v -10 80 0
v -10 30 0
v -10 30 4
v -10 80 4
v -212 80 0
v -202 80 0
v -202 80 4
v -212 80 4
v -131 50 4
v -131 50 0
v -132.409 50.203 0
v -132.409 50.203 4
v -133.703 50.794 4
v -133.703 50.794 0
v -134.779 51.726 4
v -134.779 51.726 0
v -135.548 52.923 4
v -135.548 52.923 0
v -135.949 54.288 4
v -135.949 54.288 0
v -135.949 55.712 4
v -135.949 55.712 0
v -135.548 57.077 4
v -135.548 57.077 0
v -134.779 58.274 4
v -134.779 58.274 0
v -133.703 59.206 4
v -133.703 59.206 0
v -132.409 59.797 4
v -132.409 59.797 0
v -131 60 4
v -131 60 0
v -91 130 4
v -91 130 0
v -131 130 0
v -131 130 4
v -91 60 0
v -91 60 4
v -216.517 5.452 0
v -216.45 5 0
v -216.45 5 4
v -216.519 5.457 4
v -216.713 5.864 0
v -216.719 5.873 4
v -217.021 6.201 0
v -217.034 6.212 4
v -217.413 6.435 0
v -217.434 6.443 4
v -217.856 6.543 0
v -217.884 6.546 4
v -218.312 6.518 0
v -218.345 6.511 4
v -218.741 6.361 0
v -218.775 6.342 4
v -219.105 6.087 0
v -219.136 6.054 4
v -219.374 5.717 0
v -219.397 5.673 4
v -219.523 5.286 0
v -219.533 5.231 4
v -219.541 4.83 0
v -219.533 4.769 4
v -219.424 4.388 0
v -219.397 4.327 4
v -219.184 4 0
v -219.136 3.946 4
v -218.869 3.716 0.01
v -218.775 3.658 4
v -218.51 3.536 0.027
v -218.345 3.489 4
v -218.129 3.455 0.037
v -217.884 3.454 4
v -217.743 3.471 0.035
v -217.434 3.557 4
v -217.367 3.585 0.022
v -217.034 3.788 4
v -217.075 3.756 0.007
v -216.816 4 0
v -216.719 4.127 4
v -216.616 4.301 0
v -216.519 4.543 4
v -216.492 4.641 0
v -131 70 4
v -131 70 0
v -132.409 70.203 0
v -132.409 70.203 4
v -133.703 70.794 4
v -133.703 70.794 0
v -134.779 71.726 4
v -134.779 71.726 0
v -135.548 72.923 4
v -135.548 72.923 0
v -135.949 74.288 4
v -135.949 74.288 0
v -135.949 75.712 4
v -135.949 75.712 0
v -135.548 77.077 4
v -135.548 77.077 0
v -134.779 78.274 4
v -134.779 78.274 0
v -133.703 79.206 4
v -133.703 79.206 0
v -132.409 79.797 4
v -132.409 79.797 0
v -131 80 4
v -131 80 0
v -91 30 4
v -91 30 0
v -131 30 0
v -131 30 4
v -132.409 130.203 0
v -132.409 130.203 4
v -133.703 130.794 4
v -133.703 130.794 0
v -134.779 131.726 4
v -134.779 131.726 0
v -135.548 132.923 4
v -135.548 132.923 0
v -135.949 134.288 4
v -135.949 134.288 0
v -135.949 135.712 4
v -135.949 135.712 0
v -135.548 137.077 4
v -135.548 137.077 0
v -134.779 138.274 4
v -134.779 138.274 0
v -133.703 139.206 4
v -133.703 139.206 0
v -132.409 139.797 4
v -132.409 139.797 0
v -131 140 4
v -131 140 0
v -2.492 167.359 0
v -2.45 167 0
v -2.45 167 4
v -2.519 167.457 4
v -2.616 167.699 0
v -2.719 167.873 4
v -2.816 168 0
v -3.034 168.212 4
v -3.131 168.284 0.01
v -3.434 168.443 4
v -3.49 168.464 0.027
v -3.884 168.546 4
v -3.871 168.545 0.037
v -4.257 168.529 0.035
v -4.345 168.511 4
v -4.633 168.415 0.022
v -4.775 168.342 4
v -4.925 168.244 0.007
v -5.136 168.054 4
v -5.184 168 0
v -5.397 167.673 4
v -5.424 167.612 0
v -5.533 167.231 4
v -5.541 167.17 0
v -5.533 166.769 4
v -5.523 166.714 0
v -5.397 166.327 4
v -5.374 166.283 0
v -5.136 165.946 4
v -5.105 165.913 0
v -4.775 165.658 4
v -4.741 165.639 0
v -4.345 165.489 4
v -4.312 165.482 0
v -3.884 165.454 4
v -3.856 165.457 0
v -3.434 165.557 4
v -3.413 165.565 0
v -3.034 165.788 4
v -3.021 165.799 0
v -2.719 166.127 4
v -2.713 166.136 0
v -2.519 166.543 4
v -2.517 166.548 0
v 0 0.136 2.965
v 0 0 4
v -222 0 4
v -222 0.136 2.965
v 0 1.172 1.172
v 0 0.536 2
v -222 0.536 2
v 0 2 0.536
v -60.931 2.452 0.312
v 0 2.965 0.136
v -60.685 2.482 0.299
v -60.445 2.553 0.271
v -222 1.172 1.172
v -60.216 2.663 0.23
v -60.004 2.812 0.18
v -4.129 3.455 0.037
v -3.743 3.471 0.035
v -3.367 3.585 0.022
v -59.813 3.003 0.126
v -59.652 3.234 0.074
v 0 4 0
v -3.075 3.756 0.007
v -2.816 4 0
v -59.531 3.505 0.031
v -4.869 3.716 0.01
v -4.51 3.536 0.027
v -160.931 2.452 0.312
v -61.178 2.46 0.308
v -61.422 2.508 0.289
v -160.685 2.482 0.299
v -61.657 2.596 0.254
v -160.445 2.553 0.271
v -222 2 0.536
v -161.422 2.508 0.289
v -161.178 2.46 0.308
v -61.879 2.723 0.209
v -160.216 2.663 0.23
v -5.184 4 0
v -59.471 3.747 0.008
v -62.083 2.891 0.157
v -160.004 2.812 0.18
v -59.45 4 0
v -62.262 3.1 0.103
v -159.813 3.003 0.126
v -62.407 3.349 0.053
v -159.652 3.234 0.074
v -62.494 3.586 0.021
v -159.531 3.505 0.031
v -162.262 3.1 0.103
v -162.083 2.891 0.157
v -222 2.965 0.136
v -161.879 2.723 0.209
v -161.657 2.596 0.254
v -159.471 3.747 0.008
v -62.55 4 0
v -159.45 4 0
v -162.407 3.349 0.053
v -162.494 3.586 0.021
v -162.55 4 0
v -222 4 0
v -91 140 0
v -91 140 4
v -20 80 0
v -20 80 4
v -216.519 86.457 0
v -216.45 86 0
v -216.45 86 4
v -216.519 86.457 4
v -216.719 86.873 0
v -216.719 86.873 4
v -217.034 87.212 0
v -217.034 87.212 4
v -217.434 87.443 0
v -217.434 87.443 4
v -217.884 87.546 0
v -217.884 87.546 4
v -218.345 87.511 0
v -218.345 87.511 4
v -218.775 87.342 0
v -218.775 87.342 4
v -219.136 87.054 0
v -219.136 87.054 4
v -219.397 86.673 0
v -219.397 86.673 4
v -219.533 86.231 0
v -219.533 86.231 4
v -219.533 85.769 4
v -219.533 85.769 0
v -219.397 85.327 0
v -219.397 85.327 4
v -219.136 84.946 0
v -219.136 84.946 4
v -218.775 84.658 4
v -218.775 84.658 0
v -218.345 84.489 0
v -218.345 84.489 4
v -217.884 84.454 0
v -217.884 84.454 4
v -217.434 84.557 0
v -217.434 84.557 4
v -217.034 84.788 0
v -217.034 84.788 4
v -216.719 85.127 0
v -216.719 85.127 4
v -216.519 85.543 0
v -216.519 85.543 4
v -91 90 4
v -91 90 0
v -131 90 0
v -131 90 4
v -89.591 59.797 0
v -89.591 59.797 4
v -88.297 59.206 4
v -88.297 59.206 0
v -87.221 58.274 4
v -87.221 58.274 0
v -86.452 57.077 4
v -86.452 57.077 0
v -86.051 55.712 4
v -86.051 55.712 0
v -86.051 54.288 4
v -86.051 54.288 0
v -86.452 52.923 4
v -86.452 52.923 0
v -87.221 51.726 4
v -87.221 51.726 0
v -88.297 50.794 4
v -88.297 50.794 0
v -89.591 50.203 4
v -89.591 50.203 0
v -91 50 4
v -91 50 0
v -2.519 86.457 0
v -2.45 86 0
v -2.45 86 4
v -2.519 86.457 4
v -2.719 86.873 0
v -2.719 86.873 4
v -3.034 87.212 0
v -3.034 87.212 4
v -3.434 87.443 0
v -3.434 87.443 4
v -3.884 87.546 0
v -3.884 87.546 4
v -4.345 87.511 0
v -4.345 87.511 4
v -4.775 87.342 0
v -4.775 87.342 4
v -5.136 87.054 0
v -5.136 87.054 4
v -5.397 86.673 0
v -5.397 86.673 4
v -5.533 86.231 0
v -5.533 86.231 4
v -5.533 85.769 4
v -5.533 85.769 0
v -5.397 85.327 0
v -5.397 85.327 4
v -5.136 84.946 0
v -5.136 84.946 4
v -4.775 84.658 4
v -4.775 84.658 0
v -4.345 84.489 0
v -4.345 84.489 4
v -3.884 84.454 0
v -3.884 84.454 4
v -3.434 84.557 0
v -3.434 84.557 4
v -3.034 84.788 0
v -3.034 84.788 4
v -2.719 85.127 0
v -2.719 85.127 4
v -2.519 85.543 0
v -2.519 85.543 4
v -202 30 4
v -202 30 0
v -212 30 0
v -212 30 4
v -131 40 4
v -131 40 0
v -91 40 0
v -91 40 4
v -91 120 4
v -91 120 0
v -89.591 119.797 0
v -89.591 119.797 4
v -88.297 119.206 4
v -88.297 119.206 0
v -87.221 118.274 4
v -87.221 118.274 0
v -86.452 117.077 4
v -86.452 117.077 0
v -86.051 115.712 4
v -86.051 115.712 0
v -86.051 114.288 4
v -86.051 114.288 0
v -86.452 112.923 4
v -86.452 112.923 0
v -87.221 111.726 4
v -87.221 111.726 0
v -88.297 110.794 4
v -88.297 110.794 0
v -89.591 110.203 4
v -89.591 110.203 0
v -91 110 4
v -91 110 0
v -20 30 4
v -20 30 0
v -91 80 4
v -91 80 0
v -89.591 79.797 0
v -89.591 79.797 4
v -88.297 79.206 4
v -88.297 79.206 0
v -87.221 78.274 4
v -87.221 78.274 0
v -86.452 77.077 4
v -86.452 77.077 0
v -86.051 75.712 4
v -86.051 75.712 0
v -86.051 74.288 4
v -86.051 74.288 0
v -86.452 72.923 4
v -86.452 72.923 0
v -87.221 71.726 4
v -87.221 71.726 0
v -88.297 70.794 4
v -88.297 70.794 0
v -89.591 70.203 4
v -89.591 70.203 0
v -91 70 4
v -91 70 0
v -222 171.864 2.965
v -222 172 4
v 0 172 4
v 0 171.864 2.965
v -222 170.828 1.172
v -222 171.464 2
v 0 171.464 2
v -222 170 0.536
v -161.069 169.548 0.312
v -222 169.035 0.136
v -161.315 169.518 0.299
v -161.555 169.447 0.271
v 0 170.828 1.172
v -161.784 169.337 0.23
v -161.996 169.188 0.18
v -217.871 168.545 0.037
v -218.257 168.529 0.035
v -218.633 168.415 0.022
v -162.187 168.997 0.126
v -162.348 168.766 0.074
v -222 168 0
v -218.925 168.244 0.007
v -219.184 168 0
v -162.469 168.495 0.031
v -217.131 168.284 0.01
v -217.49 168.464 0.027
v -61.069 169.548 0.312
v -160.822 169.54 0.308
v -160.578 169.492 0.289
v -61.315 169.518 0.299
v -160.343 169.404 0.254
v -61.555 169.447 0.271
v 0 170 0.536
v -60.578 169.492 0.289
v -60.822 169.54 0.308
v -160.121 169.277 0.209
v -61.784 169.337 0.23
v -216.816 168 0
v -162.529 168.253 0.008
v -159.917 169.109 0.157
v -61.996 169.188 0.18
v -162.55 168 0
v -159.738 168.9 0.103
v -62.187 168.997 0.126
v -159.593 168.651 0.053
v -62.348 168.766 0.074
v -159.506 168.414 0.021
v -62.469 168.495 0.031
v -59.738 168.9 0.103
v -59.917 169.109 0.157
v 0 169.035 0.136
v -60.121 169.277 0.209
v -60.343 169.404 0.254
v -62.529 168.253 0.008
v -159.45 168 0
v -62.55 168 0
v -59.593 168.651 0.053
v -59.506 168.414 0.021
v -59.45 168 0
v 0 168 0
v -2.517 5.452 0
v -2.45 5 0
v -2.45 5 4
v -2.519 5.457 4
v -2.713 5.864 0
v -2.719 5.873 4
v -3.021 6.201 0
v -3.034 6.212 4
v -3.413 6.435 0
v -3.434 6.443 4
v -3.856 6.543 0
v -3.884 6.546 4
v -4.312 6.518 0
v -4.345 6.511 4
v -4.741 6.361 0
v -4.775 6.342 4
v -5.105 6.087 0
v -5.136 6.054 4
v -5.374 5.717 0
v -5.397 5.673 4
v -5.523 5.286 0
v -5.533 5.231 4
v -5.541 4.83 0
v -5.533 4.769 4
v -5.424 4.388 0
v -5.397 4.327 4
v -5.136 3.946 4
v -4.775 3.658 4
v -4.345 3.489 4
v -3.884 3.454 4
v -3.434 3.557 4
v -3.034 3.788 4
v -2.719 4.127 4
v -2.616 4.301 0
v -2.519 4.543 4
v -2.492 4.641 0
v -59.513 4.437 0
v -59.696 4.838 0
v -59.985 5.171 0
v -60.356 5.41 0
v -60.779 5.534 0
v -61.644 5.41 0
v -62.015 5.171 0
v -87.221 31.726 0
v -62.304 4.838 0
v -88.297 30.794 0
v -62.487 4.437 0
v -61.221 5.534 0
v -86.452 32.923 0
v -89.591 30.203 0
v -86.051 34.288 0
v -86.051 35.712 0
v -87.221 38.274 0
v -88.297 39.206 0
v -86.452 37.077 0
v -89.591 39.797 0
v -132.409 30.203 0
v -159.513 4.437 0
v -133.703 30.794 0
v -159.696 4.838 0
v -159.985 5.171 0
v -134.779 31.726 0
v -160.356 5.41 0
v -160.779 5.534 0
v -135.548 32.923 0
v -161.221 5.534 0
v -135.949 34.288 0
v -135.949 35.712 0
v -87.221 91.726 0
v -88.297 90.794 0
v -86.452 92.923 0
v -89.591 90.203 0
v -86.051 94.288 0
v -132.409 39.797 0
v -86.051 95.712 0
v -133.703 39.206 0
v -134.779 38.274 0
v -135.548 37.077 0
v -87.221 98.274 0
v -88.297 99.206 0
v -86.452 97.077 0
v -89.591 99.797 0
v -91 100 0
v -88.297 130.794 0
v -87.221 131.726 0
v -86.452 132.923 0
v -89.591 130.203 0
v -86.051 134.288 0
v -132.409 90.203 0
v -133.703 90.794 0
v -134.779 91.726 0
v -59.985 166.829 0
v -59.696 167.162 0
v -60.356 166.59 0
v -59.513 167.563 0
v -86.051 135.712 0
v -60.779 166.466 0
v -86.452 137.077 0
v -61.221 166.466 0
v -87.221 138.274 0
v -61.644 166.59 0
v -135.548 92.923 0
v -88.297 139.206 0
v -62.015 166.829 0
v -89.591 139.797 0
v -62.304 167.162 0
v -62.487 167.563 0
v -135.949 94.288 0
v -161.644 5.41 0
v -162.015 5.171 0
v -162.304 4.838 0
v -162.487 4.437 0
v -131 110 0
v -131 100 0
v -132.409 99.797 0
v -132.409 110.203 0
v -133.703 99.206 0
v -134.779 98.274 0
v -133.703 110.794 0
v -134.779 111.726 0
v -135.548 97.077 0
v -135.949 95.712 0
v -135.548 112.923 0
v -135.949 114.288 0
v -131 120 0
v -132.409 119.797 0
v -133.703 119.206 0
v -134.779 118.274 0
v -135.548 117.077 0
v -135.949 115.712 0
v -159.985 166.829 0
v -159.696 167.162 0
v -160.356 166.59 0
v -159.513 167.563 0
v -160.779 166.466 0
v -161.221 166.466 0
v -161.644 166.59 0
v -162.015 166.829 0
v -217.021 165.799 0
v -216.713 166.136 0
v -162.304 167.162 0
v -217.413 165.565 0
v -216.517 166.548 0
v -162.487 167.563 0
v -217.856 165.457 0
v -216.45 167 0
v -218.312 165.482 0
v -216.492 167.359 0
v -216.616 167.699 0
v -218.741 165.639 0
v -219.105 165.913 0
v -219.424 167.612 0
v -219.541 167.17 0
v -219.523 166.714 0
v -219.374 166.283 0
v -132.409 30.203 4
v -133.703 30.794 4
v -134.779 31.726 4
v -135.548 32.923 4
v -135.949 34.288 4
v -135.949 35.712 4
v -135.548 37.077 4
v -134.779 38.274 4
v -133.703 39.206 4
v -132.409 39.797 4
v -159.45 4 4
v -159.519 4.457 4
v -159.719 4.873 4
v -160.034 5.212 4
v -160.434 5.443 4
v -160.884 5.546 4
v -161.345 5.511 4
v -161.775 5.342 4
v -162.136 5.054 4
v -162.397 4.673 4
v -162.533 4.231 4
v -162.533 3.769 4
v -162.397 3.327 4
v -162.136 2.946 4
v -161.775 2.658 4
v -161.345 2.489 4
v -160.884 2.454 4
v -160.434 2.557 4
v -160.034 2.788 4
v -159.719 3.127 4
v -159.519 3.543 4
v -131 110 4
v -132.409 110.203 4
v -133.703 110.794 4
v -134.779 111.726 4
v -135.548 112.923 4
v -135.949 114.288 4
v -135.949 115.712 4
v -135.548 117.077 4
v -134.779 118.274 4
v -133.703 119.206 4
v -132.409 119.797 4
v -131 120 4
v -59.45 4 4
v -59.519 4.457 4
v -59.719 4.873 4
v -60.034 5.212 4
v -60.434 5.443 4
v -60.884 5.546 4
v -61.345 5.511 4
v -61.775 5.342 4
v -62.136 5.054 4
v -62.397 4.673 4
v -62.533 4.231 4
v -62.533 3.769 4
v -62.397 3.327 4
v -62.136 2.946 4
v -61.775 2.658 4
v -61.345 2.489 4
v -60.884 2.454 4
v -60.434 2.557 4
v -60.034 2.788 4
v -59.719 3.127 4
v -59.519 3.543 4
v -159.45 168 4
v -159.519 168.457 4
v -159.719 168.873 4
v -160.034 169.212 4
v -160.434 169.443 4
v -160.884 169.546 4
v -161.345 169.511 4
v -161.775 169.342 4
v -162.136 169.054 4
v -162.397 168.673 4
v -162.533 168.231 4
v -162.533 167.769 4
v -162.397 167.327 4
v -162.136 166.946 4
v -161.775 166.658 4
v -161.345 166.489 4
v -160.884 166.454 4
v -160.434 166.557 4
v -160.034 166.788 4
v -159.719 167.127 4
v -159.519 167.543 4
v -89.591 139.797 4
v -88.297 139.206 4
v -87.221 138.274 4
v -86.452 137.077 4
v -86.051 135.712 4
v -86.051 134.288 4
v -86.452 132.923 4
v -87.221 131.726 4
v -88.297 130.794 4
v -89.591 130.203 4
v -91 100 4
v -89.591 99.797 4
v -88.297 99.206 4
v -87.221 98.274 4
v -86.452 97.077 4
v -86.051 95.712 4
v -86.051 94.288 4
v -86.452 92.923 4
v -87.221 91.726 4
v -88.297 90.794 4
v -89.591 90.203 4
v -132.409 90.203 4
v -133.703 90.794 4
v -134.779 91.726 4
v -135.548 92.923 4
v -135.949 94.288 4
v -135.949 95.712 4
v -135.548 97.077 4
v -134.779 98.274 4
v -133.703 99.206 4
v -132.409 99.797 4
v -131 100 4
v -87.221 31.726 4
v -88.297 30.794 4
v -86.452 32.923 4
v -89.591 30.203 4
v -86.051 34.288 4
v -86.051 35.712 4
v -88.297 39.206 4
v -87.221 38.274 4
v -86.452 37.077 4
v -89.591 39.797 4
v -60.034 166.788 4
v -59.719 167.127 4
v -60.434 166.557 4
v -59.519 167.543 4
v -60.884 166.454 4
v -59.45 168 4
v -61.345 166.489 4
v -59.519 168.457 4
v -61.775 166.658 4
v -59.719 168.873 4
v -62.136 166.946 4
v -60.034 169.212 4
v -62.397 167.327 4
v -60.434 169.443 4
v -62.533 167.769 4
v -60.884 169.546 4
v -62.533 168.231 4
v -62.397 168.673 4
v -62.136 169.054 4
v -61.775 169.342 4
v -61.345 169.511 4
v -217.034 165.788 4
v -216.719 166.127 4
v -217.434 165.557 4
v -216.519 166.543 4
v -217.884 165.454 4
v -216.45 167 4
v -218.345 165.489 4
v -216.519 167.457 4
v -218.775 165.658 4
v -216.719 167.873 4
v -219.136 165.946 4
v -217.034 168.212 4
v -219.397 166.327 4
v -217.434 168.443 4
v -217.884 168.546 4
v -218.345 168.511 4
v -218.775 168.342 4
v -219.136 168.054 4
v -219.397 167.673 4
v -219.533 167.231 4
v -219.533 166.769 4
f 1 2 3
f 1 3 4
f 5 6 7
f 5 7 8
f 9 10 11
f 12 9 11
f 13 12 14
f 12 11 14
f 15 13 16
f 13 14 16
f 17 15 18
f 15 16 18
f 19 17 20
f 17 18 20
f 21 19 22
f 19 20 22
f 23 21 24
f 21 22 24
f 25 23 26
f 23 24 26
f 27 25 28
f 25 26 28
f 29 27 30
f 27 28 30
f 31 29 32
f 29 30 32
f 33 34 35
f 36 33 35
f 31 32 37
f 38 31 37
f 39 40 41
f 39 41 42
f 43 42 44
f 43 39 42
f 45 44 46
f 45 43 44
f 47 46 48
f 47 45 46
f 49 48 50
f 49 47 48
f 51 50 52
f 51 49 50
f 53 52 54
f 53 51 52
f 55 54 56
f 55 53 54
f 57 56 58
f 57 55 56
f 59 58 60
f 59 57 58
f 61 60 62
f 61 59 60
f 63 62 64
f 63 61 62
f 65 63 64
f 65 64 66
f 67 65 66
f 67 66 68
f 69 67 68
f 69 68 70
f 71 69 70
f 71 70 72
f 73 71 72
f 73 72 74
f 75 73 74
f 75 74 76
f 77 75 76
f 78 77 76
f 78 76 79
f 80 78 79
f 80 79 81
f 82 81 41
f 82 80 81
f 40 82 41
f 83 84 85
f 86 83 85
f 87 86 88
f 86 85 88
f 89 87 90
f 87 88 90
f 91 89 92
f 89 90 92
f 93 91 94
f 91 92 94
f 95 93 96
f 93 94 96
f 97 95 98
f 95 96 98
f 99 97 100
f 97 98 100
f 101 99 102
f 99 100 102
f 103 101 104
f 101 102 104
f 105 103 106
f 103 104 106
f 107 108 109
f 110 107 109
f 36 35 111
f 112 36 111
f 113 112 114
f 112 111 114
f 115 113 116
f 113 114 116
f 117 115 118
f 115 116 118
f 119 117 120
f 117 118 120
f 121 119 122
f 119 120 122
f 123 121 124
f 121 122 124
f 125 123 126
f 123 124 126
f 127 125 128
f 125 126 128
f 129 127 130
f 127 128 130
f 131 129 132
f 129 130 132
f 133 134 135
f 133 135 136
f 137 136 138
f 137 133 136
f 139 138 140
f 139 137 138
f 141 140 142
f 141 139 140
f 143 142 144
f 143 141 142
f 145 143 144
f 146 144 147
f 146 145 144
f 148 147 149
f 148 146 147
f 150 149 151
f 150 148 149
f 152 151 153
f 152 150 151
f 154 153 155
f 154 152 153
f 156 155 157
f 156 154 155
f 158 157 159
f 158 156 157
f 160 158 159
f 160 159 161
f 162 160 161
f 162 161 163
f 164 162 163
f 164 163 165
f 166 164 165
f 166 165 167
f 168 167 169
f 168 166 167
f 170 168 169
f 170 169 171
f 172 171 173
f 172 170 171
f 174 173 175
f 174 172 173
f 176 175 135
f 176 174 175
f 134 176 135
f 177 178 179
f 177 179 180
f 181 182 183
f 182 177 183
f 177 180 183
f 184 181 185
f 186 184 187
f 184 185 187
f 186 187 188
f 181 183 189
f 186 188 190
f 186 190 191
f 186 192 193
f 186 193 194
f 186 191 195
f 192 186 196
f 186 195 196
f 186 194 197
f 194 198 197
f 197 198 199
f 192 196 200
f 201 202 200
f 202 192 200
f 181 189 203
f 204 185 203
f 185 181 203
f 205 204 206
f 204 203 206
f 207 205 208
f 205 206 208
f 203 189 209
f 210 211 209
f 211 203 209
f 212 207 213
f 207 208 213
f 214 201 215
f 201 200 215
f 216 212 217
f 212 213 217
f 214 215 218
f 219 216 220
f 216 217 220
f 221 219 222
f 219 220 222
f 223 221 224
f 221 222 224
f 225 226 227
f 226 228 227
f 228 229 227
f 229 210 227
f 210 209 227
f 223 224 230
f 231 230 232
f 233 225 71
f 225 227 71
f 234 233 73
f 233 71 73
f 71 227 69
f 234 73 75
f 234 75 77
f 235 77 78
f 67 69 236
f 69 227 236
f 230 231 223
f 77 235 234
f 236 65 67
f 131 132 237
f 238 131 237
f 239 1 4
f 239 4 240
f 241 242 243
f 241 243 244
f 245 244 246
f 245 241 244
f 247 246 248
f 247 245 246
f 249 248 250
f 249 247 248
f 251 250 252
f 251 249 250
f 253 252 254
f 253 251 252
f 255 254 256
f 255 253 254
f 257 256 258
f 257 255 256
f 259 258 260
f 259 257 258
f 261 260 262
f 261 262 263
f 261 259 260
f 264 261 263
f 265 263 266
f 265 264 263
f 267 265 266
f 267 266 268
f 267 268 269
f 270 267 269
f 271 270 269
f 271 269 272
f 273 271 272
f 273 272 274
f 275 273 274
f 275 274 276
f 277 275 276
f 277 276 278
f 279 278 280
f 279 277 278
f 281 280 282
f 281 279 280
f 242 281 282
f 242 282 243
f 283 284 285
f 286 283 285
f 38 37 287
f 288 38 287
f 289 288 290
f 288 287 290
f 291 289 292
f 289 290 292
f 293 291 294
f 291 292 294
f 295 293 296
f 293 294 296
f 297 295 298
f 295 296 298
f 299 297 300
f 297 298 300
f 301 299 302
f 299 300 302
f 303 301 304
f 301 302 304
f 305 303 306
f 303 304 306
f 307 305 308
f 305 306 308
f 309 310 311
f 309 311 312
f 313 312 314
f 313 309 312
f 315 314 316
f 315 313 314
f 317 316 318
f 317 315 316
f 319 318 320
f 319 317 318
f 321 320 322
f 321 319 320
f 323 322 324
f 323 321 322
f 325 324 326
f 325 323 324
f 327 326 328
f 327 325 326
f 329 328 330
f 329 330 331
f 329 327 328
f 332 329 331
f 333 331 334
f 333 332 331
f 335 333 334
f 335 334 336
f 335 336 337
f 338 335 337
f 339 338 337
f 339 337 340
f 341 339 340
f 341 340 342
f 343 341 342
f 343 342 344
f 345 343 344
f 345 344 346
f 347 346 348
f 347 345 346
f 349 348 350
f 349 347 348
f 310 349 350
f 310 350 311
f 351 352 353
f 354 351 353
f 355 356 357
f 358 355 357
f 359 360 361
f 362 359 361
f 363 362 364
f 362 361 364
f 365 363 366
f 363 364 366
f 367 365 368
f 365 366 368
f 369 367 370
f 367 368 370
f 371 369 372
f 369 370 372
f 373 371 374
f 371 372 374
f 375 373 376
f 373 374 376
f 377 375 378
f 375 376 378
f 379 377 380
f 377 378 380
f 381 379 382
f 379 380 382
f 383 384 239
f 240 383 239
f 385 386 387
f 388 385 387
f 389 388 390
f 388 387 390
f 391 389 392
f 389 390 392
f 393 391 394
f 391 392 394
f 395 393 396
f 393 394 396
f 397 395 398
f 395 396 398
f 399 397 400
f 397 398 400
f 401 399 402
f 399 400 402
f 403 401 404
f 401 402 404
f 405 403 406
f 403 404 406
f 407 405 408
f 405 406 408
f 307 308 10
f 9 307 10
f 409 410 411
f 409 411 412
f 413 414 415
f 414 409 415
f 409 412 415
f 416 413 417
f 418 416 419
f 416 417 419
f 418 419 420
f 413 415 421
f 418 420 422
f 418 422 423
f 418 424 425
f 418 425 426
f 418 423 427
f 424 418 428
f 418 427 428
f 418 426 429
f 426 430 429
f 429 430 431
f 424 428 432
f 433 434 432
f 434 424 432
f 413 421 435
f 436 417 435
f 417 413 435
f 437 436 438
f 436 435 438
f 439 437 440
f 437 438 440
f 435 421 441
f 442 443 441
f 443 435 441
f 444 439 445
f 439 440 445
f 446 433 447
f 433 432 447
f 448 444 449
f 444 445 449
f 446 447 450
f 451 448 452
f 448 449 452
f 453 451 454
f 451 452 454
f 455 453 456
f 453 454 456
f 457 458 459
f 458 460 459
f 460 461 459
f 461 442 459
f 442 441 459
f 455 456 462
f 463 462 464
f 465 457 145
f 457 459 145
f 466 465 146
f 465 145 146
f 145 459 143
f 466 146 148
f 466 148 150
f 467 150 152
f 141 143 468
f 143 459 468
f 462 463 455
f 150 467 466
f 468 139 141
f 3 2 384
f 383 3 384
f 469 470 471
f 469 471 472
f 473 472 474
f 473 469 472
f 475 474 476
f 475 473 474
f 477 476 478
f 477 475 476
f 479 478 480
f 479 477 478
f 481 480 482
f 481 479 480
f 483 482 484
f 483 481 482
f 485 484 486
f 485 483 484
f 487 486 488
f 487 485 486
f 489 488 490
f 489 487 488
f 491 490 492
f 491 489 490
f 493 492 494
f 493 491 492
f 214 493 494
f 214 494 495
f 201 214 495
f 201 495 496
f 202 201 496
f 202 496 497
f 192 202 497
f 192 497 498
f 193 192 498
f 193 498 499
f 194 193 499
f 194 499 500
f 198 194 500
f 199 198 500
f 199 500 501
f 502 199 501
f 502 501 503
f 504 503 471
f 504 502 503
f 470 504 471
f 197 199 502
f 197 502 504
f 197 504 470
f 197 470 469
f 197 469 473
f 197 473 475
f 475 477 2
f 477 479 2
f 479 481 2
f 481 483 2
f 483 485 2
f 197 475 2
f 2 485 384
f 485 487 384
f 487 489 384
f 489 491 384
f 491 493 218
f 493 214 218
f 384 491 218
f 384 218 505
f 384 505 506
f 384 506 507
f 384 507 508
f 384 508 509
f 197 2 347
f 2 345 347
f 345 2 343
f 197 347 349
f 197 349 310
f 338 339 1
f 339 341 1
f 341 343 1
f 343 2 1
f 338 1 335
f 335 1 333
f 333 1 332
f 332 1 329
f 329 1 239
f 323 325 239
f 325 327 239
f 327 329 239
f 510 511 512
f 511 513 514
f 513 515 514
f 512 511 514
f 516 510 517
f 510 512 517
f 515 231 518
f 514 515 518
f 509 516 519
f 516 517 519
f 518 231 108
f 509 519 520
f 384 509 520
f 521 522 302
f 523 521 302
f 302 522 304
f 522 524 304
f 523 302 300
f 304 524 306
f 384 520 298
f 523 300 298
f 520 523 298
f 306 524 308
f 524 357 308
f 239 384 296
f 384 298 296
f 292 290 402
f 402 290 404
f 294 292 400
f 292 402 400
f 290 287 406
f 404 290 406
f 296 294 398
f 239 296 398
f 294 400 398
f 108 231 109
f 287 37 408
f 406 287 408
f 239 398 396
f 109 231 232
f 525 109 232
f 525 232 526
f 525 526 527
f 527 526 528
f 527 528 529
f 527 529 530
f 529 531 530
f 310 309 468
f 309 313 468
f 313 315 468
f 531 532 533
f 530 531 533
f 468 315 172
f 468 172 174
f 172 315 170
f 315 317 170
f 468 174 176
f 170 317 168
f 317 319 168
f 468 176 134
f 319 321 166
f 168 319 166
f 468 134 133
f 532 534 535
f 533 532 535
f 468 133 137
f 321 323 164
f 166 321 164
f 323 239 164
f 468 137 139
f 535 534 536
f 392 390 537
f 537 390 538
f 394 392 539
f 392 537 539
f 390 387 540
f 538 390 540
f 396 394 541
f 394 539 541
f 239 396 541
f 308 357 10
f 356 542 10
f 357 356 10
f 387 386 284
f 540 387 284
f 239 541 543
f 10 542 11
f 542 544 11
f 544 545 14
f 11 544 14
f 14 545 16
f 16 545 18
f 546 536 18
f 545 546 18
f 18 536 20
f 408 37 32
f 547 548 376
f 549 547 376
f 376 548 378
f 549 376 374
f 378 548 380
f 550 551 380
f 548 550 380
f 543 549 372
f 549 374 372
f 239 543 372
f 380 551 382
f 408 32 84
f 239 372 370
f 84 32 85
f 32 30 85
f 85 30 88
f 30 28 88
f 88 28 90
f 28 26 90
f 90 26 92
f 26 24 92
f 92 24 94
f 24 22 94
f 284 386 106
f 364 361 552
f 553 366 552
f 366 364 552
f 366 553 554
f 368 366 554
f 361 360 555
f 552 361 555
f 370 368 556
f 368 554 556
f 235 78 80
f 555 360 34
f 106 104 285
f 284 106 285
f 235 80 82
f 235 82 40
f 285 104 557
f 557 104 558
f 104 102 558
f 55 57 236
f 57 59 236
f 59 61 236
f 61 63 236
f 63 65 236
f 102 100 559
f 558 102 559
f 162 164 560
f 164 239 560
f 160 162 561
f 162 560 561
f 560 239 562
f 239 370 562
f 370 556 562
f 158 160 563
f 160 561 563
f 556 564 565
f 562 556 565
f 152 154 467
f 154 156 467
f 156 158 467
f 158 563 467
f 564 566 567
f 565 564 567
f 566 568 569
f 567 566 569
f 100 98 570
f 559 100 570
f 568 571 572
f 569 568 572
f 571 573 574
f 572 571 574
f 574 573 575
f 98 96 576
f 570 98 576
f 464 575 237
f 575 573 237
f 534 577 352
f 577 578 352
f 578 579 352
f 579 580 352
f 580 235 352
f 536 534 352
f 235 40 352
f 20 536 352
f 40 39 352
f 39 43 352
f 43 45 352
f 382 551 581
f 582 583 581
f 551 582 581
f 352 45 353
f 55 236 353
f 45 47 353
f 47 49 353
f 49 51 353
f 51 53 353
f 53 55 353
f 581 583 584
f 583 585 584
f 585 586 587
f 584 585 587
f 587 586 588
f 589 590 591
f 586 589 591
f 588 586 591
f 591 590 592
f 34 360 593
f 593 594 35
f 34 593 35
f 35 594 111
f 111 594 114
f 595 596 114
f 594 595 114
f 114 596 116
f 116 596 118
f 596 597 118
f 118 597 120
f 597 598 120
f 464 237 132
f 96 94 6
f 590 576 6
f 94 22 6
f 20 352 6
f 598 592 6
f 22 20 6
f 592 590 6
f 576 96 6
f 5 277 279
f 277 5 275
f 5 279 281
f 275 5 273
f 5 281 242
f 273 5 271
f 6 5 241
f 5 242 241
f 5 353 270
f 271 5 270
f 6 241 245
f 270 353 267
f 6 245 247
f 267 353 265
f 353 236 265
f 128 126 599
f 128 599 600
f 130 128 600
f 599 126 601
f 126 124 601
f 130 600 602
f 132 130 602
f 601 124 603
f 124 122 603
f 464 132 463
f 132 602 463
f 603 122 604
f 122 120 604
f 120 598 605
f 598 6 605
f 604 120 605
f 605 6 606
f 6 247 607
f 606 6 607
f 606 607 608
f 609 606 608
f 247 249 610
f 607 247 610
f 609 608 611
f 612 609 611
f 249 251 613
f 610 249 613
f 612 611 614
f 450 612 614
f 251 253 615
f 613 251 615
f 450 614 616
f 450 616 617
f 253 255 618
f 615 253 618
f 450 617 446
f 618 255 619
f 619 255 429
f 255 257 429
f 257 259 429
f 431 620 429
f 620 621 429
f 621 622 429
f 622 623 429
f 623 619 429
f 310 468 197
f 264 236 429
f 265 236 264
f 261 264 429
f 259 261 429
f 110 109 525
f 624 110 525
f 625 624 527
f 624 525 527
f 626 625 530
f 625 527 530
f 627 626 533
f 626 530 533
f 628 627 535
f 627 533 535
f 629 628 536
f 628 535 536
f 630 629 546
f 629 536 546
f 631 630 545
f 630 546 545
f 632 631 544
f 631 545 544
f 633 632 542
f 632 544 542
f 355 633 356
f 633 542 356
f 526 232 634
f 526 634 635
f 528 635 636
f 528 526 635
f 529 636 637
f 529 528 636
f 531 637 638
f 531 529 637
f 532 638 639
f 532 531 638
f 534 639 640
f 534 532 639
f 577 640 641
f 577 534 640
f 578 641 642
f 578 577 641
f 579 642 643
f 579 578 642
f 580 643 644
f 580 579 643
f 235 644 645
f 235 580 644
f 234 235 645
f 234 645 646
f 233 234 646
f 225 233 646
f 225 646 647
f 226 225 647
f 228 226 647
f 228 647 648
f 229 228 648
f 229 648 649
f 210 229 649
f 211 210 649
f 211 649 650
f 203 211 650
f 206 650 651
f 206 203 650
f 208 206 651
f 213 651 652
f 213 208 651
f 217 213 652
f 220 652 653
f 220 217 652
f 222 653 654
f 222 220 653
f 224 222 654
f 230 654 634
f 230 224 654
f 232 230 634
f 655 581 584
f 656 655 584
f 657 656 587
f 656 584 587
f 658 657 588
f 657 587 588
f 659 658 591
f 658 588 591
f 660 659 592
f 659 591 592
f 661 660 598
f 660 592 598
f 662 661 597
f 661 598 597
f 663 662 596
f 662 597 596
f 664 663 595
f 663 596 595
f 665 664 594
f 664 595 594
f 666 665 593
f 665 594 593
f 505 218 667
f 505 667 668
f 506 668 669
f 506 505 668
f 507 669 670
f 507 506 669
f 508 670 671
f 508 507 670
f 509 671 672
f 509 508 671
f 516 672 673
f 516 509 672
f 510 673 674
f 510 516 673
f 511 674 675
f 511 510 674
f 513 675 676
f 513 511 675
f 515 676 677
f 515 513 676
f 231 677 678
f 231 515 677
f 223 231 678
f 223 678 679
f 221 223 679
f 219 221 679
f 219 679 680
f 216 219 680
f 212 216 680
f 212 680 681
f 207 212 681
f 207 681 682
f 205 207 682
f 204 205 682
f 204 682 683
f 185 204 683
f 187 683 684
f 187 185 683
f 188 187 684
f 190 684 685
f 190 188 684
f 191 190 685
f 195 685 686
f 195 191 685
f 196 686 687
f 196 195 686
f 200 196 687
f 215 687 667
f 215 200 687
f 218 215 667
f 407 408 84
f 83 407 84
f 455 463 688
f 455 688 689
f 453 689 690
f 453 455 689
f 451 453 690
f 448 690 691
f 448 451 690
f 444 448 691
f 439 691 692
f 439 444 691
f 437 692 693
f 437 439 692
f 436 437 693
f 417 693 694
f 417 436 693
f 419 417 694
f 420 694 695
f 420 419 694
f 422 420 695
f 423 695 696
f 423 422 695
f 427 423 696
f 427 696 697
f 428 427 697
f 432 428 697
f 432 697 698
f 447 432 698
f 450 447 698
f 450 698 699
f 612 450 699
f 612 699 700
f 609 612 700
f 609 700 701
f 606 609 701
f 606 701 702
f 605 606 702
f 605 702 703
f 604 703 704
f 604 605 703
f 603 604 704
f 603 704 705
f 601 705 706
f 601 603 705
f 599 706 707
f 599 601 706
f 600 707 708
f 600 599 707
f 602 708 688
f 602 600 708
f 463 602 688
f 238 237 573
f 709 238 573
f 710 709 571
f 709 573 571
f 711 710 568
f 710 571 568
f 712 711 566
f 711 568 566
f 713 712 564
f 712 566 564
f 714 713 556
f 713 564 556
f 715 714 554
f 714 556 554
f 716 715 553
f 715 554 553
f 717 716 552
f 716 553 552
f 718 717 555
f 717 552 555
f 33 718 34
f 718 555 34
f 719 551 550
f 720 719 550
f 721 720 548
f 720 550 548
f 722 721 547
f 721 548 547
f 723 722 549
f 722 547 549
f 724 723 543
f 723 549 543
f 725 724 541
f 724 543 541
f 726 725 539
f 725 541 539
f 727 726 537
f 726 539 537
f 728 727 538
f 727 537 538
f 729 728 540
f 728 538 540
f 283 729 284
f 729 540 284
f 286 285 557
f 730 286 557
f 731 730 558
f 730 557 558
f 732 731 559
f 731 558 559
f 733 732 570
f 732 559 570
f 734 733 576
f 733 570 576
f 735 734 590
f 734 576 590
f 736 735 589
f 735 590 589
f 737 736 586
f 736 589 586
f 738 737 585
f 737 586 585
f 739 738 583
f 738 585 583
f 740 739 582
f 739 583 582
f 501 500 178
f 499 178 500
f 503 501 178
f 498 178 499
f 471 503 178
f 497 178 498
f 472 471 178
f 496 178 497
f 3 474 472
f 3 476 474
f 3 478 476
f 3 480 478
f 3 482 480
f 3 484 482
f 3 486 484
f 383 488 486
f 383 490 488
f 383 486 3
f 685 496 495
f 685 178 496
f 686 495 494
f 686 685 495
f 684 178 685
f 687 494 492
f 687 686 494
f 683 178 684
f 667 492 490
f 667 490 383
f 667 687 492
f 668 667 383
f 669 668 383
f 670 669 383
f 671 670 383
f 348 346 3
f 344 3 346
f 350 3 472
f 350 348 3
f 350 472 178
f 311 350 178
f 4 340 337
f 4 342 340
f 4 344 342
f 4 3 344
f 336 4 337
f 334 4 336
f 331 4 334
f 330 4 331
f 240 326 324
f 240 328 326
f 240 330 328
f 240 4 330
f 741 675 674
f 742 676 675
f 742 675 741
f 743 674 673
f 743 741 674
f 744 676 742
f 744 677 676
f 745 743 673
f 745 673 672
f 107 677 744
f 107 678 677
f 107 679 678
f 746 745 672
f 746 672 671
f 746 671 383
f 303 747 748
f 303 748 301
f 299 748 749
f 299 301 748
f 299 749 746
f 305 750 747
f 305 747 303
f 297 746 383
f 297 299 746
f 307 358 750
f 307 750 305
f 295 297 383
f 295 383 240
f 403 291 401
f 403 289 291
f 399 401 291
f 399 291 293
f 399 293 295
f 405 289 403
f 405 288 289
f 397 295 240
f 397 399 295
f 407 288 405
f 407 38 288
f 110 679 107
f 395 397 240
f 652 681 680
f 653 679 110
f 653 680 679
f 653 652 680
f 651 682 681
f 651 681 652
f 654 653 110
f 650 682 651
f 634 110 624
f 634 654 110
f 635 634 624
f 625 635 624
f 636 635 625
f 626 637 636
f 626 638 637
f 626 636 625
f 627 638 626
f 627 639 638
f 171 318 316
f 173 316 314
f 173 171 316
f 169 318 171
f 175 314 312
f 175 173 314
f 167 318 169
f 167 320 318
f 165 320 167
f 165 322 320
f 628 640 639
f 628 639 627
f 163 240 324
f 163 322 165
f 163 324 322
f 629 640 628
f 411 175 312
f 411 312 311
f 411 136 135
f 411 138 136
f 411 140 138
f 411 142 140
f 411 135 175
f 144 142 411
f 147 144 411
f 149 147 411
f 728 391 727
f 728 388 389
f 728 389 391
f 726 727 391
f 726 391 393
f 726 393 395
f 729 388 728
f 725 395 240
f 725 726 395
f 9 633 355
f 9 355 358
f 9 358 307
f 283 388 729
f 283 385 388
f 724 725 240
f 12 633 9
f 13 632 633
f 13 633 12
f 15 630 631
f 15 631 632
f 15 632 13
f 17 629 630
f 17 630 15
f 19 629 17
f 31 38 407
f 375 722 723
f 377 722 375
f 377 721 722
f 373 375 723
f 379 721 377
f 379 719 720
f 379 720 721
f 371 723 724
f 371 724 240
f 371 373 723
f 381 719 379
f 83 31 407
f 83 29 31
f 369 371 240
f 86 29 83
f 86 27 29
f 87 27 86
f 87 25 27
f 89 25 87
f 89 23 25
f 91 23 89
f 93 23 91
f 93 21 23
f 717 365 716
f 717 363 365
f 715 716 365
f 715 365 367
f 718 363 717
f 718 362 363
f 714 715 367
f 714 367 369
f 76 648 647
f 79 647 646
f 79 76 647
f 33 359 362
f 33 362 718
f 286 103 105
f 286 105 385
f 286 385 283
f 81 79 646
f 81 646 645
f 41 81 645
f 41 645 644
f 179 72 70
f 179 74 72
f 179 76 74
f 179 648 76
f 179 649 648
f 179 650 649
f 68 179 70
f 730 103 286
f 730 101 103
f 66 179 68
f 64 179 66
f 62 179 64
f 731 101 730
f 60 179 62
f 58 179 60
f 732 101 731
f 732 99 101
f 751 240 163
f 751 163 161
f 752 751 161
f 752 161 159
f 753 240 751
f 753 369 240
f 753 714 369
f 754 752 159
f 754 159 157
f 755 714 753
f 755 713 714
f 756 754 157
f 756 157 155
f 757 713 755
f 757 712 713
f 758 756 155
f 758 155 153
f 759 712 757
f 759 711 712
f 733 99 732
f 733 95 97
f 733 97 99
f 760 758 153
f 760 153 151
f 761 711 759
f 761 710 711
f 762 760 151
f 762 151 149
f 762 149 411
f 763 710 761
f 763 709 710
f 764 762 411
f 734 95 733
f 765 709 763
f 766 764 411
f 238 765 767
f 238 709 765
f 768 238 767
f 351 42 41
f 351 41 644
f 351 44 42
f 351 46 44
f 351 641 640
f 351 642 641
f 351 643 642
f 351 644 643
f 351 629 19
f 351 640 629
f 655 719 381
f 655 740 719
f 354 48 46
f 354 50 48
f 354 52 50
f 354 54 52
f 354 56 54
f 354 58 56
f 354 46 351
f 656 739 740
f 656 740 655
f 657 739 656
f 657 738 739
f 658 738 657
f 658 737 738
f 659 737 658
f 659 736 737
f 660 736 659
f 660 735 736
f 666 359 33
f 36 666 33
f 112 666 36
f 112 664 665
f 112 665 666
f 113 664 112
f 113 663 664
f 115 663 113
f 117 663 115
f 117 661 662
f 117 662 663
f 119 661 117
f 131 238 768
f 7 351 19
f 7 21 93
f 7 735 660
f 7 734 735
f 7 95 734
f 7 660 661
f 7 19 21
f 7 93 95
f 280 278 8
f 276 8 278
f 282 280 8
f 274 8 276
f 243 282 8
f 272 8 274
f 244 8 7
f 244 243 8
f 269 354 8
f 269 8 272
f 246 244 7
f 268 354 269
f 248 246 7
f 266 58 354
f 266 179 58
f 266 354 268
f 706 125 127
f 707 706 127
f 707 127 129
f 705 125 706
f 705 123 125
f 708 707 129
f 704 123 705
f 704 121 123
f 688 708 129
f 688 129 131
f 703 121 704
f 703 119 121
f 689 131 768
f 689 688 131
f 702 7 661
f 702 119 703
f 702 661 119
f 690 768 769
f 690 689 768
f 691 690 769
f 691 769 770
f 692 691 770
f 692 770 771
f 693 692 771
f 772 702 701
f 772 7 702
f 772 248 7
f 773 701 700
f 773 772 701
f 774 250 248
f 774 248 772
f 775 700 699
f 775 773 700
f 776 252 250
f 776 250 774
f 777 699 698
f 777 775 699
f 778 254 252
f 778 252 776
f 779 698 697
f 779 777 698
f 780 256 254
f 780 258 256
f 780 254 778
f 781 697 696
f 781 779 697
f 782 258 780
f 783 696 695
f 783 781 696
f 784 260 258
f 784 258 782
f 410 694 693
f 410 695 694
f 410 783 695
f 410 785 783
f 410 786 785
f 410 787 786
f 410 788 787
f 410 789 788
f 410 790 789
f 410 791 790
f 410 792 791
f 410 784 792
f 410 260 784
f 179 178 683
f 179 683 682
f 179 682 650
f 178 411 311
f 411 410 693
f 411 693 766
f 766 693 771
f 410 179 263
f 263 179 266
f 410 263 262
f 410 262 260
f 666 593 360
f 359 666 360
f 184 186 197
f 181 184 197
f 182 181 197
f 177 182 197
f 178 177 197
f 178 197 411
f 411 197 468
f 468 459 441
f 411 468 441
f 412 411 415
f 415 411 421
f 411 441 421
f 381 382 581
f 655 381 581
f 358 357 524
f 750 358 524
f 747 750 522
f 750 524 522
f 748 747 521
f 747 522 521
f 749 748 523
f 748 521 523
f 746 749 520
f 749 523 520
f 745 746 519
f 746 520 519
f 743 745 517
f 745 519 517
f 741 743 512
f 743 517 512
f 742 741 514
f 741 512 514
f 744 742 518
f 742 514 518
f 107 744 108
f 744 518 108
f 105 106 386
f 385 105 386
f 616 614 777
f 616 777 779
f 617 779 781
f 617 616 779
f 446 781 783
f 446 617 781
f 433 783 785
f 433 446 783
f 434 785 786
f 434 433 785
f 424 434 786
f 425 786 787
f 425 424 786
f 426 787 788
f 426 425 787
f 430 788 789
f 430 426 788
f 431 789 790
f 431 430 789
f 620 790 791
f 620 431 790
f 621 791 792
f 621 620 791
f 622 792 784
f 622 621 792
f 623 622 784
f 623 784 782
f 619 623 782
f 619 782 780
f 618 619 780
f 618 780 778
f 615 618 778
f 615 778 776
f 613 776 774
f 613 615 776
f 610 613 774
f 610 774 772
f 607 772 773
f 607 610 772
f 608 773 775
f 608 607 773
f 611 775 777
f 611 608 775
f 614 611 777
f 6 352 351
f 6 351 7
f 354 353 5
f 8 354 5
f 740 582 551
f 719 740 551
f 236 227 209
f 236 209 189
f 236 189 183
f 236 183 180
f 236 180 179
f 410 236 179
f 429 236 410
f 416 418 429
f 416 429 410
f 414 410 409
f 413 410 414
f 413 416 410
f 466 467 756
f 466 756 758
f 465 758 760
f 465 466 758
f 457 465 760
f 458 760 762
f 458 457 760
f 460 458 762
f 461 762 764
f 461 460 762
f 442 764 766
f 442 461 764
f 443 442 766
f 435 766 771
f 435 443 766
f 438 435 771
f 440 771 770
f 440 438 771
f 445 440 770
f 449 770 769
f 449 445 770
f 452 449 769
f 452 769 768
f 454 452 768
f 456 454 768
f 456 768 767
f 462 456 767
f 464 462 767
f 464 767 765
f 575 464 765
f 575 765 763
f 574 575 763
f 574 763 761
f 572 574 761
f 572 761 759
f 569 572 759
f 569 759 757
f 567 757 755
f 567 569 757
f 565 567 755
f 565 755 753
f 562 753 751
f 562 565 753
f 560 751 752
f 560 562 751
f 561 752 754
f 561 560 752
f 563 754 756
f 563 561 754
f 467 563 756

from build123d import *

# Parameters (mm, degrees)
SKETCH1_W           = 172
SKETCH1_H           = 222
SKETCH1_R           = 1.55
SKETCH1_W_2         = 50
SKETCH1_H_2         = 10
BOSS_EXTRUDE2_DEPTH = 4
FILLET1_R           = 4


with BuildPart() as part:
    # Sketch1 → Boss-Extrude2 (new body)
    with BuildSketch(Plane(origin=(0, 0, 0), x_dir=(0, 1, 0), z_dir=(0, 0, 1))):
        with Locations((86, 111)):
            Rectangle(SKETCH1_W, SKETCH1_H)
        with Locations(Location((5, 4, 0), (0, 0, 270))):
            Circle(SKETCH1_R, mode=Mode.SUBTRACT)
        with Locations(Location((5, 218, 0), (0, 0, 270))):
            Circle(SKETCH1_R, mode=Mode.SUBTRACT)
        with Locations(Location((167, 218, 0), (0, 0, 270))):
            Circle(SKETCH1_R, mode=Mode.SUBTRACT)
        with Locations(Location((167, 4, 0), (0, 0, 270))):
            Circle(SKETCH1_R, mode=Mode.SUBTRACT)
        with Locations(Location((86, 218, 0), (0, 0, 270))):
            Circle(SKETCH1_R, mode=Mode.SUBTRACT)
        with Locations(Location((86, 4, 0), (0, 0, 270))):
            Circle(SKETCH1_R, mode=Mode.SUBTRACT)
        with Locations(Location((4, 61, 0), (0, 0, 270))):
            Circle(SKETCH1_R, mode=Mode.SUBTRACT)
        with Locations(Location((168, 61, 0), (0, 0, 270))):
            Circle(SKETCH1_R, mode=Mode.SUBTRACT)
        with Locations(Location((168, 161, 0), (0, 0, 270))):
            Circle(SKETCH1_R, mode=Mode.SUBTRACT)
        with Locations(Location((4, 161, 0), (0, 0, 270))):
            Circle(SKETCH1_R, mode=Mode.SUBTRACT)
        with Locations((55, 207)):
            Rectangle(SKETCH1_W_2, SKETCH1_H_2, mode=Mode.SUBTRACT)
        with Locations((55, 15)):
            Rectangle(SKETCH1_W_2, SKETCH1_H_2, mode=Mode.SUBTRACT)
        with BuildLine():
            Line((40, 131), (40, 91))
            ThreePointArc((40, 91), (35, 86), (30, 91))
            Line((30, 91), (30, 131))
            ThreePointArc((30, 131), (35, 136), (40, 131))
        make_face(mode=Mode.SUBTRACT)
        with BuildLine():
            Line((60, 131), (60, 91))
            ThreePointArc((60, 91), (55, 86), (50, 91))
            Line((50, 91), (50, 131))
            ThreePointArc((50, 131), (55, 136), (60, 131))
        make_face(mode=Mode.SUBTRACT)
        with BuildLine():
            Line((80, 131), (80, 91))
            ThreePointArc((80, 91), (75, 86), (70, 91))
            Line((70, 91), (70, 131))
            ThreePointArc((70, 131), (75, 136), (80, 131))
        make_face(mode=Mode.SUBTRACT)
        with BuildLine():
            Line((100, 131), (100, 91))
            ThreePointArc((100, 91), (95, 86), (90, 91))
            Line((90, 91), (90, 131))
            ThreePointArc((90, 131), (95, 136), (100, 131))
        make_face(mode=Mode.SUBTRACT)
        with BuildLine():
            Line((120, 131), (120, 91))
            ThreePointArc((120, 91), (115, 86), (110, 91))
            Line((110, 91), (110, 131))
            ThreePointArc((110, 131), (115, 136), (120, 131))
        make_face(mode=Mode.SUBTRACT)
        with BuildLine():
            Line((140, 131), (140, 91))
            ThreePointArc((140, 91), (135, 86), (130, 91))
            Line((130, 91), (130, 131))
            ThreePointArc((130, 131), (135, 136), (140, 131))
        make_face(mode=Mode.SUBTRACT)
    extrude(amount=BOSS_EXTRUDE2_DEPTH)

    # Fillet1
    # the kernel refuses this fillet: 4 mm, written as the material it takes off along each edge
    with BuildSketch(Plane(origin=(10, 172, 0), x_dir=(0, 0, 1), z_dir=(-1, 0, 0)), Plane(origin=(-232, 0, 0), x_dir=(0, 0, 1), z_dir=(1, 0, 0))) as fillet1_piece_1:
        with BuildLine():
            CenterArc((FILLET1_R, -FILLET1_R), FILLET1_R, 90, 90)
            Line((0, -FILLET1_R), (0, 0))
            Line((0, 0), (FILLET1_R, 0))
        make_face()
    extrude(amount=242, mode=Mode.SUBTRACT)


solid = part.part
